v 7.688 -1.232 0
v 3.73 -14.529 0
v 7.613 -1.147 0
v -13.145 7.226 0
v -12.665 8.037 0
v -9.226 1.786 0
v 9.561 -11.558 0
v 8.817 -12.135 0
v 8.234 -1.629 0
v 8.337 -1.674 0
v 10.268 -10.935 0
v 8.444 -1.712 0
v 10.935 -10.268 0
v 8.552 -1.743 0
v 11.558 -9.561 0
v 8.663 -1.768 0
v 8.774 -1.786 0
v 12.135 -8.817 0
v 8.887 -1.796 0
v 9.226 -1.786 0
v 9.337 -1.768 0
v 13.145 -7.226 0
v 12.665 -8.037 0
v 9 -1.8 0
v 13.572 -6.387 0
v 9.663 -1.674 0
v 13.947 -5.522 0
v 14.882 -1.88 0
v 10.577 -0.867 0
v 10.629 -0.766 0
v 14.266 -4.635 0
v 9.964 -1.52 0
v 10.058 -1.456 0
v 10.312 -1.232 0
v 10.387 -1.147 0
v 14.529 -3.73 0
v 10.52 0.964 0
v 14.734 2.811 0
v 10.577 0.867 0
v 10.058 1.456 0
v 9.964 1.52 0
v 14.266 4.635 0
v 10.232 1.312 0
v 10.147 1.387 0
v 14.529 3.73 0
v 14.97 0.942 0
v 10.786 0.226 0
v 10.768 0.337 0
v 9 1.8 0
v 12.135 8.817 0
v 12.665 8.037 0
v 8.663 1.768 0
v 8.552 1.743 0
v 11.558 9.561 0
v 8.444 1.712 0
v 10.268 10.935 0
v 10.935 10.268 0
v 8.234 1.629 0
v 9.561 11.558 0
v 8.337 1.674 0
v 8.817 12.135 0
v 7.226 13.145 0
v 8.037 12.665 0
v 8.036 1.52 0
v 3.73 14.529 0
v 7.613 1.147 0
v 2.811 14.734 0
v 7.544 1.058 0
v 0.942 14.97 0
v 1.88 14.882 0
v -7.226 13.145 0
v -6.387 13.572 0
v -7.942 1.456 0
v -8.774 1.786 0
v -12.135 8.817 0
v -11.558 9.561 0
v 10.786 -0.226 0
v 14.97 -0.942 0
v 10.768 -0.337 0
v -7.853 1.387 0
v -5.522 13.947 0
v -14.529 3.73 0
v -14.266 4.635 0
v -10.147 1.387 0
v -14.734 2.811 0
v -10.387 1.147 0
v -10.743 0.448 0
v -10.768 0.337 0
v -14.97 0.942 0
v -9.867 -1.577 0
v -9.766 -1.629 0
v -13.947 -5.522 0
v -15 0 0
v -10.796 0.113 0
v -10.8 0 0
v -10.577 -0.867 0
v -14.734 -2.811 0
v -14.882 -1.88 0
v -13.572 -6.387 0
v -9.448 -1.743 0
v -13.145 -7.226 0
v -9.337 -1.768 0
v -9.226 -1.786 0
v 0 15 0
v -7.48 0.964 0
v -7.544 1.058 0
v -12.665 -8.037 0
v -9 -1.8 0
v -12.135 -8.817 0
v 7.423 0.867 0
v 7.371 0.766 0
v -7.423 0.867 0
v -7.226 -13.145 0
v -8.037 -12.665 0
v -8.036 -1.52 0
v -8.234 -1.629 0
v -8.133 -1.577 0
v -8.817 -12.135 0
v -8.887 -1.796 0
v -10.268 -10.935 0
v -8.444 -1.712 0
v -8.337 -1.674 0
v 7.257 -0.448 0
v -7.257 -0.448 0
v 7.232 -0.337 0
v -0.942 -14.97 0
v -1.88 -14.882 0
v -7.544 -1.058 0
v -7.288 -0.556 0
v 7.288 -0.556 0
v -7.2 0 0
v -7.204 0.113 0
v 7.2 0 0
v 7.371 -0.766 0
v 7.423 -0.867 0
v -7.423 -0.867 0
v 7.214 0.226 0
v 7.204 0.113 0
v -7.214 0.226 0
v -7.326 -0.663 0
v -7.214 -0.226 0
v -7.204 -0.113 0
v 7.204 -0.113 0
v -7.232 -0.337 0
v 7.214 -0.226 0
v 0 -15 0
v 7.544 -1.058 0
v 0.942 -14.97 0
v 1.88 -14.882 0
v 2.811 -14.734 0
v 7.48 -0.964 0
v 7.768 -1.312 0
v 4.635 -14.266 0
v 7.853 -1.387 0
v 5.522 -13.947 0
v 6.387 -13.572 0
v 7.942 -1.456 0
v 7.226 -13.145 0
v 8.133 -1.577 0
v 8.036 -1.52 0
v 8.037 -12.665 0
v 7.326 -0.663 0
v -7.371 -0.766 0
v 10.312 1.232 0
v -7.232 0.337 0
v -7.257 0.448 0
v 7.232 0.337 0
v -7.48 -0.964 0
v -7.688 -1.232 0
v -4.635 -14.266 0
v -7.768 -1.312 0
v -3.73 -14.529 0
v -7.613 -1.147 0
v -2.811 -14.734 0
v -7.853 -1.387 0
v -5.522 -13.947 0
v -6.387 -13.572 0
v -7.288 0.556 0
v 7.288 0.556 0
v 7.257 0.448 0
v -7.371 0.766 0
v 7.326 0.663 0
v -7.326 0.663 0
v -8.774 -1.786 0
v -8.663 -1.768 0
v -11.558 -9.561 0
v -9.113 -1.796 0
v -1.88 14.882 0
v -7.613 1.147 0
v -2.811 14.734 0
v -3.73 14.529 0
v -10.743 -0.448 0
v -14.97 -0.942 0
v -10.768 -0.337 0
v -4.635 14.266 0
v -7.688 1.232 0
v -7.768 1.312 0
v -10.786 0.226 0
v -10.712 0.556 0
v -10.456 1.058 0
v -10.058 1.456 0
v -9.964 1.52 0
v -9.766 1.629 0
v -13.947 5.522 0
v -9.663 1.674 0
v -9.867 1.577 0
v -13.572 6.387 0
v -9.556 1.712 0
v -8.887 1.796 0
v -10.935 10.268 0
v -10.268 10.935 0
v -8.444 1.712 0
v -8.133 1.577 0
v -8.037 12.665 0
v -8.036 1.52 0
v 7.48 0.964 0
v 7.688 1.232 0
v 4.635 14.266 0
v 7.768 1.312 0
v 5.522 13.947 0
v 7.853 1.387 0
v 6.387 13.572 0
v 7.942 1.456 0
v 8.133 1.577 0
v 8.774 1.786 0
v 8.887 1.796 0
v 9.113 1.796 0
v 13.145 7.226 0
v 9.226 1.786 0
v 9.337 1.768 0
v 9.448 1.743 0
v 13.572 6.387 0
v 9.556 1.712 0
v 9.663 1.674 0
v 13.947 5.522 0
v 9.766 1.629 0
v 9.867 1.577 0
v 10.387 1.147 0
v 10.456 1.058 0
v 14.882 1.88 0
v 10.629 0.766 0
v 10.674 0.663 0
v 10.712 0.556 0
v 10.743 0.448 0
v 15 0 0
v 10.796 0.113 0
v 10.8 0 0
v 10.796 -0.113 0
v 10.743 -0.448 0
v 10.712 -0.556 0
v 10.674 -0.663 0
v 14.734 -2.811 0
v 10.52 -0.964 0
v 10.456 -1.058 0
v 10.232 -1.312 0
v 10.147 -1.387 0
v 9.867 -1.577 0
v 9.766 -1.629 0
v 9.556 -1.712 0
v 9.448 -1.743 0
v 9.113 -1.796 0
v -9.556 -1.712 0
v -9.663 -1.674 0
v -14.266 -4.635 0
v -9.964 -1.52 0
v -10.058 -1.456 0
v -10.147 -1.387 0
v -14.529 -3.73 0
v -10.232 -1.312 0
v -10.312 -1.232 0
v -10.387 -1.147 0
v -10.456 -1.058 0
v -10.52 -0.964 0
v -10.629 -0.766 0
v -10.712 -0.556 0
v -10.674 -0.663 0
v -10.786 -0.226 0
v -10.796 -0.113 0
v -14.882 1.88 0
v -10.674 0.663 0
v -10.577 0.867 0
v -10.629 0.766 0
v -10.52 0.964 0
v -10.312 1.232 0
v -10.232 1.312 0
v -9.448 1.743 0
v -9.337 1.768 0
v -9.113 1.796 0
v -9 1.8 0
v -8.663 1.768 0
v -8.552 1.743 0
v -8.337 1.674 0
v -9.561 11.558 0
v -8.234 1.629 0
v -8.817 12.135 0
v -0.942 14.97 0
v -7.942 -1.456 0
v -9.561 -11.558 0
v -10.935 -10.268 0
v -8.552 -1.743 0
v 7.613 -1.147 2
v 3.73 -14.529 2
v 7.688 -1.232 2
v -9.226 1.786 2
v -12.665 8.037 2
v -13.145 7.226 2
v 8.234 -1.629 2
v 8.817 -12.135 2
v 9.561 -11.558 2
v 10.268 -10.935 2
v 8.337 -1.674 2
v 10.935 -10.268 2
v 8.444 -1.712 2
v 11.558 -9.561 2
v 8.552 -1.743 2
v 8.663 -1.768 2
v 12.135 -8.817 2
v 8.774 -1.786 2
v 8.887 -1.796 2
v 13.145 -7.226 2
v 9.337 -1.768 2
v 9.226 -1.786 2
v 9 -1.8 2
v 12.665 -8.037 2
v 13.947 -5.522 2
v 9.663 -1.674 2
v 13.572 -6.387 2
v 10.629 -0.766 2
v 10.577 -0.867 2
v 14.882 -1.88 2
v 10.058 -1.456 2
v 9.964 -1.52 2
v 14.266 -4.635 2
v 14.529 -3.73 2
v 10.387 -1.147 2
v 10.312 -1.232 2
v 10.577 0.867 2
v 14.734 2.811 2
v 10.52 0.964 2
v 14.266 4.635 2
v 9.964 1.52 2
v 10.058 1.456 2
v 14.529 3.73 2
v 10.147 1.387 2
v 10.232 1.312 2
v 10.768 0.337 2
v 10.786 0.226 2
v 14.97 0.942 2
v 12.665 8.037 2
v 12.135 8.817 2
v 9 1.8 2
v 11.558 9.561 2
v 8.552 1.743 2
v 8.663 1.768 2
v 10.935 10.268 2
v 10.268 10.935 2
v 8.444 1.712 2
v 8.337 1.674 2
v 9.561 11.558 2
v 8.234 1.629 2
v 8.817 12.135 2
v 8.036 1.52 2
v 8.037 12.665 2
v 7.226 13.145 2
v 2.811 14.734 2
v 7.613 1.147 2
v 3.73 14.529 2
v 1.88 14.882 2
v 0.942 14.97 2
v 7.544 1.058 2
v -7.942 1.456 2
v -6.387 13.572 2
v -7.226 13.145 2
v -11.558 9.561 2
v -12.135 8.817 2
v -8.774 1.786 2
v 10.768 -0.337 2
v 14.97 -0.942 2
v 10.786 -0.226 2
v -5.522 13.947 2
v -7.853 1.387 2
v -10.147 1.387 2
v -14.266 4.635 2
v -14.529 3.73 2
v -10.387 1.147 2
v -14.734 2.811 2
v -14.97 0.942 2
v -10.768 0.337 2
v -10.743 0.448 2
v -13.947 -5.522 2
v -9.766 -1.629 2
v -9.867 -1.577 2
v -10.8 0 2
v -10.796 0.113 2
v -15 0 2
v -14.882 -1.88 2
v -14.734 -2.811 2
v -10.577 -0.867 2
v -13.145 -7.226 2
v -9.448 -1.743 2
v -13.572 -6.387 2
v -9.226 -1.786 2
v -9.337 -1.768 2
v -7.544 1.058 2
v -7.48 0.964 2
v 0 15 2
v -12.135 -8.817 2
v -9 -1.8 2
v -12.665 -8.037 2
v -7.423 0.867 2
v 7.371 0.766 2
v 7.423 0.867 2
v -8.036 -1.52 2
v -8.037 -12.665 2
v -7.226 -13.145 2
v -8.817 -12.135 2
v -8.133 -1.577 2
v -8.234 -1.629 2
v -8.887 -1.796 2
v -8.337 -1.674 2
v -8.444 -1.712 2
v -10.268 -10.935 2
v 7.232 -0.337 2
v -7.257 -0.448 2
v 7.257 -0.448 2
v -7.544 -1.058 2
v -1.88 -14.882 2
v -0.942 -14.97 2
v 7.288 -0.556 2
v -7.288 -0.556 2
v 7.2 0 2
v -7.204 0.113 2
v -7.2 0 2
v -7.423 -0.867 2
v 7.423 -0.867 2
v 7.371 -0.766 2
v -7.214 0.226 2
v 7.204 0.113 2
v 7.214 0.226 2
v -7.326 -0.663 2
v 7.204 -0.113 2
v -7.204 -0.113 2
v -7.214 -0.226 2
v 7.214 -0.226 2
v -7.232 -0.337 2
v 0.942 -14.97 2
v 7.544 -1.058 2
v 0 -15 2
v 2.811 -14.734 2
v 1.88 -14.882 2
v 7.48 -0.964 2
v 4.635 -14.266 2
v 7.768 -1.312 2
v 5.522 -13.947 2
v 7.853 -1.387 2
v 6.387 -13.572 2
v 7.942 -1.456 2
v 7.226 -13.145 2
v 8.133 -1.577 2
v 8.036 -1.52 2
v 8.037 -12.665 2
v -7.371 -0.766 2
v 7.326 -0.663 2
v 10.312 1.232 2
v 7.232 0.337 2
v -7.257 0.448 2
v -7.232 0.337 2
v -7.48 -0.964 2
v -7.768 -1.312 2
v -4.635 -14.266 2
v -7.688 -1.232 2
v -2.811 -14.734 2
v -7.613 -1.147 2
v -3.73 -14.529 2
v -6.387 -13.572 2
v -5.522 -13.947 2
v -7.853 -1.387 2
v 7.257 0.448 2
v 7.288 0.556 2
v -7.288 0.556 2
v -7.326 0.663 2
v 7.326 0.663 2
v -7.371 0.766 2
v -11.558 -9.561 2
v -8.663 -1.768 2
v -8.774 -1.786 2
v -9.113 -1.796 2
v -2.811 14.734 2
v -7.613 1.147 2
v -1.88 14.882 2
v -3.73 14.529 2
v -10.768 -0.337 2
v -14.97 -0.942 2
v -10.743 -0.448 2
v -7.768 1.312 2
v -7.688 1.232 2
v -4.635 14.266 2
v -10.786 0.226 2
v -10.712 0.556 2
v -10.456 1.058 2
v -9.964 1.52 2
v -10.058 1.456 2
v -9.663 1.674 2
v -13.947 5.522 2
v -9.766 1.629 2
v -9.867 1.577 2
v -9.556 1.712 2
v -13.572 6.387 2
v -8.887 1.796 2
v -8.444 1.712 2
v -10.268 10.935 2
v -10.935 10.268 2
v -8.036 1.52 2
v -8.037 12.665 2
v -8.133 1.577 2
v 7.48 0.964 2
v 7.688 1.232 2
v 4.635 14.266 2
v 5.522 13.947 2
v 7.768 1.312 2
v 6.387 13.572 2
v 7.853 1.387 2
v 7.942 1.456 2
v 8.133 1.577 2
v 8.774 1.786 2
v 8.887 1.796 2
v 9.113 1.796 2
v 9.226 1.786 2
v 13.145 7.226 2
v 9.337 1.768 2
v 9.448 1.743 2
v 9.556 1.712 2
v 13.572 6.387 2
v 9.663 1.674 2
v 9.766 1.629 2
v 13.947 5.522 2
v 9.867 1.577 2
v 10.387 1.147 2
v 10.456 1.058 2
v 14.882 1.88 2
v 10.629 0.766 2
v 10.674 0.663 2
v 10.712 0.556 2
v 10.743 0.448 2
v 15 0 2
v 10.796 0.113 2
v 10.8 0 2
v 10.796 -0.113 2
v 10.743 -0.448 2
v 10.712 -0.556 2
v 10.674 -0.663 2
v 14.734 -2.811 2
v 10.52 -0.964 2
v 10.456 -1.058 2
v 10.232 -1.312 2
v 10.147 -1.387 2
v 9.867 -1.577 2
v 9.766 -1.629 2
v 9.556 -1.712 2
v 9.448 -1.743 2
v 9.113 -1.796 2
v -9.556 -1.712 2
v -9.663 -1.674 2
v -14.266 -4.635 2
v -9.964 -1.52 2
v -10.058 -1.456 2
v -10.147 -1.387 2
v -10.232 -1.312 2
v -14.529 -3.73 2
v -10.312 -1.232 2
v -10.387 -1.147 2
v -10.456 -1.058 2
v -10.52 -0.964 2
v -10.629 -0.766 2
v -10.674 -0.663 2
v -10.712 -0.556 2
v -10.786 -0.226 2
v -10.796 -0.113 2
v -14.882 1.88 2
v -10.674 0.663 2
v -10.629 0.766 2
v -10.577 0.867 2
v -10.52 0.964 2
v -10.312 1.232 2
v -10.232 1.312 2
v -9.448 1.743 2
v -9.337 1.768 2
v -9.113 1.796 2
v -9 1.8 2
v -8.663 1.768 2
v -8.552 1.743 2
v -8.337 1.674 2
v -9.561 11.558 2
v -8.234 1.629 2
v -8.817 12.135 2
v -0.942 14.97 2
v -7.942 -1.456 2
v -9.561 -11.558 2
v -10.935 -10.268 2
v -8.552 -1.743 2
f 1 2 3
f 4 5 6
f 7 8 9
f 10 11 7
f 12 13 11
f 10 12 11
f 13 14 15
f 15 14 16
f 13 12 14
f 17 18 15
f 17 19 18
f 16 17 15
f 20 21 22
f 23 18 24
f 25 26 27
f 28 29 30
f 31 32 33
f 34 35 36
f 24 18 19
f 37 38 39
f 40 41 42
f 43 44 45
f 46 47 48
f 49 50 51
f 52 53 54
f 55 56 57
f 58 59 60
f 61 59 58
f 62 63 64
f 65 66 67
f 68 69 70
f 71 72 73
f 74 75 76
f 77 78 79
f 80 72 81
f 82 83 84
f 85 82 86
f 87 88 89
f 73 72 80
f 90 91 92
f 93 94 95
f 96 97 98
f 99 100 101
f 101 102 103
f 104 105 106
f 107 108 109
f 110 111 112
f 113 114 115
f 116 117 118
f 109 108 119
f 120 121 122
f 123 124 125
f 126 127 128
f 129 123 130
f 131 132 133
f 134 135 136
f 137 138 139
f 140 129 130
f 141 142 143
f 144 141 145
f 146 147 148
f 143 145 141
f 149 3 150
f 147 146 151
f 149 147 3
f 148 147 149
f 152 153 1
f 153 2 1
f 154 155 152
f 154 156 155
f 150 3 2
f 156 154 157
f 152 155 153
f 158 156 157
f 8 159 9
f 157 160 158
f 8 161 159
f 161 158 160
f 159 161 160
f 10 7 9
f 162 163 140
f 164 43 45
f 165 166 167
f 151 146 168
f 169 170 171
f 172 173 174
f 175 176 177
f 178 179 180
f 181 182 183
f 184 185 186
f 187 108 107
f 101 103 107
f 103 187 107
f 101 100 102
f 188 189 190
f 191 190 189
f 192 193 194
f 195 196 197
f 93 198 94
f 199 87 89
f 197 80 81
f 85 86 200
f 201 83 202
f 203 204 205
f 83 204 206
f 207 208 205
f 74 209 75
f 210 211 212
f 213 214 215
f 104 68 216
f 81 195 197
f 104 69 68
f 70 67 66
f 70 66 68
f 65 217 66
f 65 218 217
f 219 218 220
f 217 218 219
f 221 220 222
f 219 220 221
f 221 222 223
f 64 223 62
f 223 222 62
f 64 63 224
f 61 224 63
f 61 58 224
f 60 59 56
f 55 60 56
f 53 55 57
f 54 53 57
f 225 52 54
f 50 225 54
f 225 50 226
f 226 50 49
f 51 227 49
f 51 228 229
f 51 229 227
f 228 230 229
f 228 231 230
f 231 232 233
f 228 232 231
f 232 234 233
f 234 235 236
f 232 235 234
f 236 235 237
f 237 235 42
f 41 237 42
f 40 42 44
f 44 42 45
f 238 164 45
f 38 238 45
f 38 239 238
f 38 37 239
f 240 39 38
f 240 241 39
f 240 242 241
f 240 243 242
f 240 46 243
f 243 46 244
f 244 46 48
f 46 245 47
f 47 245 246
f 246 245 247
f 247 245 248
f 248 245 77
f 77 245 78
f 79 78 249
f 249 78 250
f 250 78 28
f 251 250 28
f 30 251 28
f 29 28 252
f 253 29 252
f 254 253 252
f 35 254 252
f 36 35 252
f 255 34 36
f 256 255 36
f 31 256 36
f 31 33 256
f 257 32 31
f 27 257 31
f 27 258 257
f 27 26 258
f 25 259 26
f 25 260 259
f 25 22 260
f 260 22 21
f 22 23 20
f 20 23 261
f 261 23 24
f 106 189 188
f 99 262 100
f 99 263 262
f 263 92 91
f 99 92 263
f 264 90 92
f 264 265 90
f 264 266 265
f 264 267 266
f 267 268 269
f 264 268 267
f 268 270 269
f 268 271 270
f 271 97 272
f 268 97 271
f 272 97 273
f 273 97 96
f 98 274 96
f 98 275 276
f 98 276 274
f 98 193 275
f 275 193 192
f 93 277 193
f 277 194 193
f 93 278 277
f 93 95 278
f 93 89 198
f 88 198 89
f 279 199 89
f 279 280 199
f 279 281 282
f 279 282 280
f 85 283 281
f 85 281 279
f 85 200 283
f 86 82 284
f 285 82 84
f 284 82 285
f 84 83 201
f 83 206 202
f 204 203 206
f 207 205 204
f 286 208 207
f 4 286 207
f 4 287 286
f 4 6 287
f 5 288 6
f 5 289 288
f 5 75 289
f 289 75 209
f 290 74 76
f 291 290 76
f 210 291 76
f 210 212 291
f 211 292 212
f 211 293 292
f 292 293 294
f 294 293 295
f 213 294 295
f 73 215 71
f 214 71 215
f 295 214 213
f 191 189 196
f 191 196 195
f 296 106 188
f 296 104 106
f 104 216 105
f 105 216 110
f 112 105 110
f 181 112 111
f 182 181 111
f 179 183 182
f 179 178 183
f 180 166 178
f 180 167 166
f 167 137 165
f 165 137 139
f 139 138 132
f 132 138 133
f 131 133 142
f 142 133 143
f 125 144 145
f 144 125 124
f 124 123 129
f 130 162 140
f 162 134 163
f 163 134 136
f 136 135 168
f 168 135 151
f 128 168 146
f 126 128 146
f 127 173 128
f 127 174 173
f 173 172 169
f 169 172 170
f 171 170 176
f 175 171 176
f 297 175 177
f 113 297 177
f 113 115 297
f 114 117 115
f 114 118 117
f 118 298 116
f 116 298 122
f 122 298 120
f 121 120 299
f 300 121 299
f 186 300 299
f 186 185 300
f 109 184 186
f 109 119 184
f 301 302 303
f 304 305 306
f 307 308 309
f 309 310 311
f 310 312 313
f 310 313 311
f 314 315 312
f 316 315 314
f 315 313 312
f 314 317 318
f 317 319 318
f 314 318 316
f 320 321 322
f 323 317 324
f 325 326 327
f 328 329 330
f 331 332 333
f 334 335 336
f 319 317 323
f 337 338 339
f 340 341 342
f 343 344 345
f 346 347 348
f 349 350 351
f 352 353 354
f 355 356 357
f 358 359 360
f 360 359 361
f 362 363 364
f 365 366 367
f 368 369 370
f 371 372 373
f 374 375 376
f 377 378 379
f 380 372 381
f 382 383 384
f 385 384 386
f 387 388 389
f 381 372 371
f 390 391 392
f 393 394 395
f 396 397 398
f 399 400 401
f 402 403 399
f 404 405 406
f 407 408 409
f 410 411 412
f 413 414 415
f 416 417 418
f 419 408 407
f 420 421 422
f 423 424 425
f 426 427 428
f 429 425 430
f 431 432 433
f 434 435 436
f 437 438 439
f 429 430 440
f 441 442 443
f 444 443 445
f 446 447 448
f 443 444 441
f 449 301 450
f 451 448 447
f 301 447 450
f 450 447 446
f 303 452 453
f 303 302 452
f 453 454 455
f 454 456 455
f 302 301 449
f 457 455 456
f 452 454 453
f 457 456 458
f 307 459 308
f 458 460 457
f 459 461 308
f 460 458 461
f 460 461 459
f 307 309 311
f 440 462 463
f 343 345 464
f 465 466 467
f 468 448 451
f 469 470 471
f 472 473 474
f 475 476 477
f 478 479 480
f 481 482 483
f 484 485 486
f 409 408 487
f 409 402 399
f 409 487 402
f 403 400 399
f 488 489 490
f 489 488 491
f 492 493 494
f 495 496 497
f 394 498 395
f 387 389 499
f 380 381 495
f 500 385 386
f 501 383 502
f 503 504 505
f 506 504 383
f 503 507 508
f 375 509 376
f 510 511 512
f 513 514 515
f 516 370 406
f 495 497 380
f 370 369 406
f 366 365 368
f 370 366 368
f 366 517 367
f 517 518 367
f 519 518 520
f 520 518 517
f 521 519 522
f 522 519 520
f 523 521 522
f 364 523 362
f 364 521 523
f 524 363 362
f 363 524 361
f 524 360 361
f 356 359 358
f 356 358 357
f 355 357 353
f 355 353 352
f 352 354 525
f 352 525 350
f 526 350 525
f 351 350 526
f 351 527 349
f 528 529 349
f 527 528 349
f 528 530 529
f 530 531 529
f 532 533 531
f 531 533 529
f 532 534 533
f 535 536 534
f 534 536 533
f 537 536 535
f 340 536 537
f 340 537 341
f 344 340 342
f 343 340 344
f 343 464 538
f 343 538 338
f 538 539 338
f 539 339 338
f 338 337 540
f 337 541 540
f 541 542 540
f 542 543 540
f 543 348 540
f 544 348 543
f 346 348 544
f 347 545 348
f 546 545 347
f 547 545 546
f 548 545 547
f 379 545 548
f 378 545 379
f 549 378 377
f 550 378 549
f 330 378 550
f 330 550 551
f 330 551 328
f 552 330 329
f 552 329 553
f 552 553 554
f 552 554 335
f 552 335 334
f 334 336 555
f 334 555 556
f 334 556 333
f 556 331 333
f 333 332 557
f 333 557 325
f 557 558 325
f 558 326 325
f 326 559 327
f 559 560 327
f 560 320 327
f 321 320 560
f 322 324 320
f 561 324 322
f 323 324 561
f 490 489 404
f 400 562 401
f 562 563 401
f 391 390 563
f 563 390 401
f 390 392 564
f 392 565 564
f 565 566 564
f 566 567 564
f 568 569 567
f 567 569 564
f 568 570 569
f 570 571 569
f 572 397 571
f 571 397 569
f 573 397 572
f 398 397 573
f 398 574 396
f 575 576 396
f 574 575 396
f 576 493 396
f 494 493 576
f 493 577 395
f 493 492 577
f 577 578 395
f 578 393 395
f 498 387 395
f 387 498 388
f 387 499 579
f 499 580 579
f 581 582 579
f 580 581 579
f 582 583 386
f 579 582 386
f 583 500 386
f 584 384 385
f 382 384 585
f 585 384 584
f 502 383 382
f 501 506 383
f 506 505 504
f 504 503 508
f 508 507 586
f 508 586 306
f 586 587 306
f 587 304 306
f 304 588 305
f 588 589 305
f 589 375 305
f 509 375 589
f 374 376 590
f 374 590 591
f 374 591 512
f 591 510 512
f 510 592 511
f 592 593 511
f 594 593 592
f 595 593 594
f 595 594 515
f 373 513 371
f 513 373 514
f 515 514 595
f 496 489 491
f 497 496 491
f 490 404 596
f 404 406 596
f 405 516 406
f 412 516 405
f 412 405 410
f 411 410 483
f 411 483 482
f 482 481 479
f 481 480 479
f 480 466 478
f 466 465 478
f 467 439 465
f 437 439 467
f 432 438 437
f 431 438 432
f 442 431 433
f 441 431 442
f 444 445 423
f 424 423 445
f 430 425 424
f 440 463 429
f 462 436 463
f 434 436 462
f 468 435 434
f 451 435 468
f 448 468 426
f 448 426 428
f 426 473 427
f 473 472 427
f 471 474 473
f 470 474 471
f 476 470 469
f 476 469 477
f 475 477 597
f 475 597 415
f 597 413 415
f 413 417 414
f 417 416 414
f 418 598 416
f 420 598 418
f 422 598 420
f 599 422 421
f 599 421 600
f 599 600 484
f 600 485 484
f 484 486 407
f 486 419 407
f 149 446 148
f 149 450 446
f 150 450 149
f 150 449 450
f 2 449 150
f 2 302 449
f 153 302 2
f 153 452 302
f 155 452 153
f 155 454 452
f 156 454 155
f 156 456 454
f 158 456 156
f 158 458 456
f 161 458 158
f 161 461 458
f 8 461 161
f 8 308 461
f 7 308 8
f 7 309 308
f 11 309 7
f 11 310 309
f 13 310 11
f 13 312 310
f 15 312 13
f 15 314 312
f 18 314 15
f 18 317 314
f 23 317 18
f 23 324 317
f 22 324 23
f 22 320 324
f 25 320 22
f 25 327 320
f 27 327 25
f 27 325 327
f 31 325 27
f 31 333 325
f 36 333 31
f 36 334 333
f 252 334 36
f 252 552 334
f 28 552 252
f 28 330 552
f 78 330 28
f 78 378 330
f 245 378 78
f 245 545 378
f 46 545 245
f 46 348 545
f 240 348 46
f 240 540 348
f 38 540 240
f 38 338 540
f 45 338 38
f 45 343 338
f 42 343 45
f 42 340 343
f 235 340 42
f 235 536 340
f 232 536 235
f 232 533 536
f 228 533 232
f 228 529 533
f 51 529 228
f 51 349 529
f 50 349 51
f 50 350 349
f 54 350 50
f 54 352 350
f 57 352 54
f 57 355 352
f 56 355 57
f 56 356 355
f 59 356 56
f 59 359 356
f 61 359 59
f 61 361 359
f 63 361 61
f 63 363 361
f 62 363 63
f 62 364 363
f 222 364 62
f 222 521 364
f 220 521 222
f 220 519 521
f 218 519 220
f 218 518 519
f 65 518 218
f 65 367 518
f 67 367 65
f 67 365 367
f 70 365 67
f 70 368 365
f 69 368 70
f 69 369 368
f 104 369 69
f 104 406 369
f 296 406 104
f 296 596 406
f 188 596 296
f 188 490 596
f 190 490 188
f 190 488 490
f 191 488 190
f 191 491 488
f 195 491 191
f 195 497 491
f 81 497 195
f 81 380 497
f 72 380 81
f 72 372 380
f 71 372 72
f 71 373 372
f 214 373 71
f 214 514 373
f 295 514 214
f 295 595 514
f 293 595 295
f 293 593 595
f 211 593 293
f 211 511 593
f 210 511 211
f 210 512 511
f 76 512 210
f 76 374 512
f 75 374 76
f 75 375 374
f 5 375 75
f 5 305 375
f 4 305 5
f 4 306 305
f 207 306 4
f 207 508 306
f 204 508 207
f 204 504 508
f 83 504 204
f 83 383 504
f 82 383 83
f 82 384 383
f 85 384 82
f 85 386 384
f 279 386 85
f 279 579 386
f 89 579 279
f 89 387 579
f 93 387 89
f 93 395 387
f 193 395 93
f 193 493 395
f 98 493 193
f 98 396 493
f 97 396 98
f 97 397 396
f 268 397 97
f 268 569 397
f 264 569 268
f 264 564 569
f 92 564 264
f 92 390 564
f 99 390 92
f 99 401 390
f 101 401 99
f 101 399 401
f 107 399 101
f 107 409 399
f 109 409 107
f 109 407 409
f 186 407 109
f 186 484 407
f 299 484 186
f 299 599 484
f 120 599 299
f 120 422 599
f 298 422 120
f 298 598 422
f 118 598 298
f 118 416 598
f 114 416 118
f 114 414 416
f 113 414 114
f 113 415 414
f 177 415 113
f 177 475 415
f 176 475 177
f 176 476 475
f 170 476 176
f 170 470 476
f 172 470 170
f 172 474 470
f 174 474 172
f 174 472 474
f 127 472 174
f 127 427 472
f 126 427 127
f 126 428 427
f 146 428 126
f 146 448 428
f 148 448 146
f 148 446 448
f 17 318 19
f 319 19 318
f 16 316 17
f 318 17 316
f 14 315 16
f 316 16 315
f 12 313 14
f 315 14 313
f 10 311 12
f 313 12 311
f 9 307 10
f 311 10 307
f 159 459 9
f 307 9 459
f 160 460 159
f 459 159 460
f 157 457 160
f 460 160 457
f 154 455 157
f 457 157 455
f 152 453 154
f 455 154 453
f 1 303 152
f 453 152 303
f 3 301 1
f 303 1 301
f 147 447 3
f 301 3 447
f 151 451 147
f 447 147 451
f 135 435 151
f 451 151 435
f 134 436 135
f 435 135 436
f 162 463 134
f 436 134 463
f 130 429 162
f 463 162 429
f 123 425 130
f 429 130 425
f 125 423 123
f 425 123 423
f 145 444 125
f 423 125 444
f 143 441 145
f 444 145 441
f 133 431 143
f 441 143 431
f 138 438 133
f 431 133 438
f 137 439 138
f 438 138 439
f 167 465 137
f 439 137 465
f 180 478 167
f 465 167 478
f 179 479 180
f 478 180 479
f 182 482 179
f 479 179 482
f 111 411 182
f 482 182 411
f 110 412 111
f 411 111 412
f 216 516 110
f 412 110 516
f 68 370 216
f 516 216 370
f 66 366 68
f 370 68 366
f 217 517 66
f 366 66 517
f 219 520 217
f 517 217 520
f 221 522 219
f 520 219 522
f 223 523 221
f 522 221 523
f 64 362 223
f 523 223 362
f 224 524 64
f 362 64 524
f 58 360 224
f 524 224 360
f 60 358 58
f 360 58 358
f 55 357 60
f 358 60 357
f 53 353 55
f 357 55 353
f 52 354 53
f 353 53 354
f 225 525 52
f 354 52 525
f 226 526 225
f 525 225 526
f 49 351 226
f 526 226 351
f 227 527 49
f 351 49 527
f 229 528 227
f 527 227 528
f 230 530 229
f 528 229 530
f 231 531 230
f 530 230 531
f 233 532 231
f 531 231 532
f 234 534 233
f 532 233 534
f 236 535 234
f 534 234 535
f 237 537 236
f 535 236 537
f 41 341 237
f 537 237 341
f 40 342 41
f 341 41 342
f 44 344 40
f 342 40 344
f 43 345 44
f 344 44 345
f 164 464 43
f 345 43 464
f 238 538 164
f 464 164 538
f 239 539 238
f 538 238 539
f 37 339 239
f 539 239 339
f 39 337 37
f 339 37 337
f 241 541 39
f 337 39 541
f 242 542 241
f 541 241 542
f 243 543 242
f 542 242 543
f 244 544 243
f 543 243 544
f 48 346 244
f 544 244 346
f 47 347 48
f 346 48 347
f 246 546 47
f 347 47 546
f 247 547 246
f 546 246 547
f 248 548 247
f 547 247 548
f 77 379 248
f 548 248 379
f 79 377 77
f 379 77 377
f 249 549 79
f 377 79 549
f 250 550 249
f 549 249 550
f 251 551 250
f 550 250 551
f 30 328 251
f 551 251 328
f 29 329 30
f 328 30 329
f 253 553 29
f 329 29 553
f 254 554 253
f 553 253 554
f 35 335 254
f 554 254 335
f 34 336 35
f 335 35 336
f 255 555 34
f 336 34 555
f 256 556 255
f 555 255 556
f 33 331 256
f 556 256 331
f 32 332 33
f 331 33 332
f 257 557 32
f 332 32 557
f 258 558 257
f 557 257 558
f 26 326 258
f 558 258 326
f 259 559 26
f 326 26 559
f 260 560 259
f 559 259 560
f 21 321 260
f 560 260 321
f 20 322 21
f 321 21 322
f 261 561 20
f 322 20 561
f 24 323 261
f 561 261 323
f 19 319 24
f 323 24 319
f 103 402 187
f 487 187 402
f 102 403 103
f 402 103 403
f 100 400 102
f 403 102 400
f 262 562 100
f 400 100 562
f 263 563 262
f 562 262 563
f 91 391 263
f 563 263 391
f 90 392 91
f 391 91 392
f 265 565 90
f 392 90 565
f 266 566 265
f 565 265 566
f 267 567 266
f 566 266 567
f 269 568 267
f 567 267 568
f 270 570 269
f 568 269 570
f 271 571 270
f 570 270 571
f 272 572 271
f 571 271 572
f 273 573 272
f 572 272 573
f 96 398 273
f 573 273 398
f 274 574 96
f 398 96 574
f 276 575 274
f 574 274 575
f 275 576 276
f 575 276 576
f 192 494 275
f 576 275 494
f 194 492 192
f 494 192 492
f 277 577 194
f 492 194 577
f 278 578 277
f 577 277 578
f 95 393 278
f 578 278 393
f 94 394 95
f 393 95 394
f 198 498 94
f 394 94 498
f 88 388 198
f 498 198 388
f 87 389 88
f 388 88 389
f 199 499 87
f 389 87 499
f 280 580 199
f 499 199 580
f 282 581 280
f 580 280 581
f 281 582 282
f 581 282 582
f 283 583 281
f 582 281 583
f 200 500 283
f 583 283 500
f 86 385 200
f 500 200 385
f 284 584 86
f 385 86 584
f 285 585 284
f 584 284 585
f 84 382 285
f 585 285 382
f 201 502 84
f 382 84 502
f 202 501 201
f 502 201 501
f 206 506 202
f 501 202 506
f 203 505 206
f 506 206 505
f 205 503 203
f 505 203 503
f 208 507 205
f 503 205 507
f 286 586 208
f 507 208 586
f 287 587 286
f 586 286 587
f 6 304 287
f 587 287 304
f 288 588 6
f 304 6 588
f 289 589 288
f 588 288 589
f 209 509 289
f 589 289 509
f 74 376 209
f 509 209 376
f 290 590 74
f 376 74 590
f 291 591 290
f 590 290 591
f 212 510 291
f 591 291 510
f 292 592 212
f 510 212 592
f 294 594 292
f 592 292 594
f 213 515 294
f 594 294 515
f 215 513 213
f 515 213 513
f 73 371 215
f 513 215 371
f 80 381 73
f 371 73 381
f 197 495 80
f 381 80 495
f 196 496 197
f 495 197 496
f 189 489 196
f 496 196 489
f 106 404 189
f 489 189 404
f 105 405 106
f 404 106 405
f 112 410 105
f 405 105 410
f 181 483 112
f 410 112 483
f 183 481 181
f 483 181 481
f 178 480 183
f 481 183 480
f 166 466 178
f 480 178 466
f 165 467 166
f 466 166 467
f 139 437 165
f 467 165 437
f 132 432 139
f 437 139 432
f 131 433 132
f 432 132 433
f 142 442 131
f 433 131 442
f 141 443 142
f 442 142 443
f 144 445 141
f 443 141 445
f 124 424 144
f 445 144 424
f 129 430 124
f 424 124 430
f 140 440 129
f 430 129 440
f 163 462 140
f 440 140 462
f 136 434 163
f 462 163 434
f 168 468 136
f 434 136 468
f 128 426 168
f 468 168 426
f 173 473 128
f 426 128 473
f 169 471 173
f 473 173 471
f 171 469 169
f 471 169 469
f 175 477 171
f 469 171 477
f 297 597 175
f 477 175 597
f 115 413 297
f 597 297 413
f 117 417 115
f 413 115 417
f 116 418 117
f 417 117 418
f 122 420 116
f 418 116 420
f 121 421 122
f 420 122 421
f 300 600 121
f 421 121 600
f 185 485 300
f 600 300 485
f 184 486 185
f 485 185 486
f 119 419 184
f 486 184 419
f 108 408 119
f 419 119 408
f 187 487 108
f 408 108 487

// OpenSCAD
$fn=100;
holder_back_thickness = 2;
holder_diameter = 30;
hole_diameter = 3.6;

linear_extrude(height=holder_back_thickness) {
    difference() {
        circle(d = holder_diameter);

        let(hole_position = holder_diameter * 0.3) {
            translate([hole_position, 0, 0])
                circle(d = hole_diameter);
            translate([- hole_position, 0, 0])
                circle(d = hole_diameter);
        }
    }
}
